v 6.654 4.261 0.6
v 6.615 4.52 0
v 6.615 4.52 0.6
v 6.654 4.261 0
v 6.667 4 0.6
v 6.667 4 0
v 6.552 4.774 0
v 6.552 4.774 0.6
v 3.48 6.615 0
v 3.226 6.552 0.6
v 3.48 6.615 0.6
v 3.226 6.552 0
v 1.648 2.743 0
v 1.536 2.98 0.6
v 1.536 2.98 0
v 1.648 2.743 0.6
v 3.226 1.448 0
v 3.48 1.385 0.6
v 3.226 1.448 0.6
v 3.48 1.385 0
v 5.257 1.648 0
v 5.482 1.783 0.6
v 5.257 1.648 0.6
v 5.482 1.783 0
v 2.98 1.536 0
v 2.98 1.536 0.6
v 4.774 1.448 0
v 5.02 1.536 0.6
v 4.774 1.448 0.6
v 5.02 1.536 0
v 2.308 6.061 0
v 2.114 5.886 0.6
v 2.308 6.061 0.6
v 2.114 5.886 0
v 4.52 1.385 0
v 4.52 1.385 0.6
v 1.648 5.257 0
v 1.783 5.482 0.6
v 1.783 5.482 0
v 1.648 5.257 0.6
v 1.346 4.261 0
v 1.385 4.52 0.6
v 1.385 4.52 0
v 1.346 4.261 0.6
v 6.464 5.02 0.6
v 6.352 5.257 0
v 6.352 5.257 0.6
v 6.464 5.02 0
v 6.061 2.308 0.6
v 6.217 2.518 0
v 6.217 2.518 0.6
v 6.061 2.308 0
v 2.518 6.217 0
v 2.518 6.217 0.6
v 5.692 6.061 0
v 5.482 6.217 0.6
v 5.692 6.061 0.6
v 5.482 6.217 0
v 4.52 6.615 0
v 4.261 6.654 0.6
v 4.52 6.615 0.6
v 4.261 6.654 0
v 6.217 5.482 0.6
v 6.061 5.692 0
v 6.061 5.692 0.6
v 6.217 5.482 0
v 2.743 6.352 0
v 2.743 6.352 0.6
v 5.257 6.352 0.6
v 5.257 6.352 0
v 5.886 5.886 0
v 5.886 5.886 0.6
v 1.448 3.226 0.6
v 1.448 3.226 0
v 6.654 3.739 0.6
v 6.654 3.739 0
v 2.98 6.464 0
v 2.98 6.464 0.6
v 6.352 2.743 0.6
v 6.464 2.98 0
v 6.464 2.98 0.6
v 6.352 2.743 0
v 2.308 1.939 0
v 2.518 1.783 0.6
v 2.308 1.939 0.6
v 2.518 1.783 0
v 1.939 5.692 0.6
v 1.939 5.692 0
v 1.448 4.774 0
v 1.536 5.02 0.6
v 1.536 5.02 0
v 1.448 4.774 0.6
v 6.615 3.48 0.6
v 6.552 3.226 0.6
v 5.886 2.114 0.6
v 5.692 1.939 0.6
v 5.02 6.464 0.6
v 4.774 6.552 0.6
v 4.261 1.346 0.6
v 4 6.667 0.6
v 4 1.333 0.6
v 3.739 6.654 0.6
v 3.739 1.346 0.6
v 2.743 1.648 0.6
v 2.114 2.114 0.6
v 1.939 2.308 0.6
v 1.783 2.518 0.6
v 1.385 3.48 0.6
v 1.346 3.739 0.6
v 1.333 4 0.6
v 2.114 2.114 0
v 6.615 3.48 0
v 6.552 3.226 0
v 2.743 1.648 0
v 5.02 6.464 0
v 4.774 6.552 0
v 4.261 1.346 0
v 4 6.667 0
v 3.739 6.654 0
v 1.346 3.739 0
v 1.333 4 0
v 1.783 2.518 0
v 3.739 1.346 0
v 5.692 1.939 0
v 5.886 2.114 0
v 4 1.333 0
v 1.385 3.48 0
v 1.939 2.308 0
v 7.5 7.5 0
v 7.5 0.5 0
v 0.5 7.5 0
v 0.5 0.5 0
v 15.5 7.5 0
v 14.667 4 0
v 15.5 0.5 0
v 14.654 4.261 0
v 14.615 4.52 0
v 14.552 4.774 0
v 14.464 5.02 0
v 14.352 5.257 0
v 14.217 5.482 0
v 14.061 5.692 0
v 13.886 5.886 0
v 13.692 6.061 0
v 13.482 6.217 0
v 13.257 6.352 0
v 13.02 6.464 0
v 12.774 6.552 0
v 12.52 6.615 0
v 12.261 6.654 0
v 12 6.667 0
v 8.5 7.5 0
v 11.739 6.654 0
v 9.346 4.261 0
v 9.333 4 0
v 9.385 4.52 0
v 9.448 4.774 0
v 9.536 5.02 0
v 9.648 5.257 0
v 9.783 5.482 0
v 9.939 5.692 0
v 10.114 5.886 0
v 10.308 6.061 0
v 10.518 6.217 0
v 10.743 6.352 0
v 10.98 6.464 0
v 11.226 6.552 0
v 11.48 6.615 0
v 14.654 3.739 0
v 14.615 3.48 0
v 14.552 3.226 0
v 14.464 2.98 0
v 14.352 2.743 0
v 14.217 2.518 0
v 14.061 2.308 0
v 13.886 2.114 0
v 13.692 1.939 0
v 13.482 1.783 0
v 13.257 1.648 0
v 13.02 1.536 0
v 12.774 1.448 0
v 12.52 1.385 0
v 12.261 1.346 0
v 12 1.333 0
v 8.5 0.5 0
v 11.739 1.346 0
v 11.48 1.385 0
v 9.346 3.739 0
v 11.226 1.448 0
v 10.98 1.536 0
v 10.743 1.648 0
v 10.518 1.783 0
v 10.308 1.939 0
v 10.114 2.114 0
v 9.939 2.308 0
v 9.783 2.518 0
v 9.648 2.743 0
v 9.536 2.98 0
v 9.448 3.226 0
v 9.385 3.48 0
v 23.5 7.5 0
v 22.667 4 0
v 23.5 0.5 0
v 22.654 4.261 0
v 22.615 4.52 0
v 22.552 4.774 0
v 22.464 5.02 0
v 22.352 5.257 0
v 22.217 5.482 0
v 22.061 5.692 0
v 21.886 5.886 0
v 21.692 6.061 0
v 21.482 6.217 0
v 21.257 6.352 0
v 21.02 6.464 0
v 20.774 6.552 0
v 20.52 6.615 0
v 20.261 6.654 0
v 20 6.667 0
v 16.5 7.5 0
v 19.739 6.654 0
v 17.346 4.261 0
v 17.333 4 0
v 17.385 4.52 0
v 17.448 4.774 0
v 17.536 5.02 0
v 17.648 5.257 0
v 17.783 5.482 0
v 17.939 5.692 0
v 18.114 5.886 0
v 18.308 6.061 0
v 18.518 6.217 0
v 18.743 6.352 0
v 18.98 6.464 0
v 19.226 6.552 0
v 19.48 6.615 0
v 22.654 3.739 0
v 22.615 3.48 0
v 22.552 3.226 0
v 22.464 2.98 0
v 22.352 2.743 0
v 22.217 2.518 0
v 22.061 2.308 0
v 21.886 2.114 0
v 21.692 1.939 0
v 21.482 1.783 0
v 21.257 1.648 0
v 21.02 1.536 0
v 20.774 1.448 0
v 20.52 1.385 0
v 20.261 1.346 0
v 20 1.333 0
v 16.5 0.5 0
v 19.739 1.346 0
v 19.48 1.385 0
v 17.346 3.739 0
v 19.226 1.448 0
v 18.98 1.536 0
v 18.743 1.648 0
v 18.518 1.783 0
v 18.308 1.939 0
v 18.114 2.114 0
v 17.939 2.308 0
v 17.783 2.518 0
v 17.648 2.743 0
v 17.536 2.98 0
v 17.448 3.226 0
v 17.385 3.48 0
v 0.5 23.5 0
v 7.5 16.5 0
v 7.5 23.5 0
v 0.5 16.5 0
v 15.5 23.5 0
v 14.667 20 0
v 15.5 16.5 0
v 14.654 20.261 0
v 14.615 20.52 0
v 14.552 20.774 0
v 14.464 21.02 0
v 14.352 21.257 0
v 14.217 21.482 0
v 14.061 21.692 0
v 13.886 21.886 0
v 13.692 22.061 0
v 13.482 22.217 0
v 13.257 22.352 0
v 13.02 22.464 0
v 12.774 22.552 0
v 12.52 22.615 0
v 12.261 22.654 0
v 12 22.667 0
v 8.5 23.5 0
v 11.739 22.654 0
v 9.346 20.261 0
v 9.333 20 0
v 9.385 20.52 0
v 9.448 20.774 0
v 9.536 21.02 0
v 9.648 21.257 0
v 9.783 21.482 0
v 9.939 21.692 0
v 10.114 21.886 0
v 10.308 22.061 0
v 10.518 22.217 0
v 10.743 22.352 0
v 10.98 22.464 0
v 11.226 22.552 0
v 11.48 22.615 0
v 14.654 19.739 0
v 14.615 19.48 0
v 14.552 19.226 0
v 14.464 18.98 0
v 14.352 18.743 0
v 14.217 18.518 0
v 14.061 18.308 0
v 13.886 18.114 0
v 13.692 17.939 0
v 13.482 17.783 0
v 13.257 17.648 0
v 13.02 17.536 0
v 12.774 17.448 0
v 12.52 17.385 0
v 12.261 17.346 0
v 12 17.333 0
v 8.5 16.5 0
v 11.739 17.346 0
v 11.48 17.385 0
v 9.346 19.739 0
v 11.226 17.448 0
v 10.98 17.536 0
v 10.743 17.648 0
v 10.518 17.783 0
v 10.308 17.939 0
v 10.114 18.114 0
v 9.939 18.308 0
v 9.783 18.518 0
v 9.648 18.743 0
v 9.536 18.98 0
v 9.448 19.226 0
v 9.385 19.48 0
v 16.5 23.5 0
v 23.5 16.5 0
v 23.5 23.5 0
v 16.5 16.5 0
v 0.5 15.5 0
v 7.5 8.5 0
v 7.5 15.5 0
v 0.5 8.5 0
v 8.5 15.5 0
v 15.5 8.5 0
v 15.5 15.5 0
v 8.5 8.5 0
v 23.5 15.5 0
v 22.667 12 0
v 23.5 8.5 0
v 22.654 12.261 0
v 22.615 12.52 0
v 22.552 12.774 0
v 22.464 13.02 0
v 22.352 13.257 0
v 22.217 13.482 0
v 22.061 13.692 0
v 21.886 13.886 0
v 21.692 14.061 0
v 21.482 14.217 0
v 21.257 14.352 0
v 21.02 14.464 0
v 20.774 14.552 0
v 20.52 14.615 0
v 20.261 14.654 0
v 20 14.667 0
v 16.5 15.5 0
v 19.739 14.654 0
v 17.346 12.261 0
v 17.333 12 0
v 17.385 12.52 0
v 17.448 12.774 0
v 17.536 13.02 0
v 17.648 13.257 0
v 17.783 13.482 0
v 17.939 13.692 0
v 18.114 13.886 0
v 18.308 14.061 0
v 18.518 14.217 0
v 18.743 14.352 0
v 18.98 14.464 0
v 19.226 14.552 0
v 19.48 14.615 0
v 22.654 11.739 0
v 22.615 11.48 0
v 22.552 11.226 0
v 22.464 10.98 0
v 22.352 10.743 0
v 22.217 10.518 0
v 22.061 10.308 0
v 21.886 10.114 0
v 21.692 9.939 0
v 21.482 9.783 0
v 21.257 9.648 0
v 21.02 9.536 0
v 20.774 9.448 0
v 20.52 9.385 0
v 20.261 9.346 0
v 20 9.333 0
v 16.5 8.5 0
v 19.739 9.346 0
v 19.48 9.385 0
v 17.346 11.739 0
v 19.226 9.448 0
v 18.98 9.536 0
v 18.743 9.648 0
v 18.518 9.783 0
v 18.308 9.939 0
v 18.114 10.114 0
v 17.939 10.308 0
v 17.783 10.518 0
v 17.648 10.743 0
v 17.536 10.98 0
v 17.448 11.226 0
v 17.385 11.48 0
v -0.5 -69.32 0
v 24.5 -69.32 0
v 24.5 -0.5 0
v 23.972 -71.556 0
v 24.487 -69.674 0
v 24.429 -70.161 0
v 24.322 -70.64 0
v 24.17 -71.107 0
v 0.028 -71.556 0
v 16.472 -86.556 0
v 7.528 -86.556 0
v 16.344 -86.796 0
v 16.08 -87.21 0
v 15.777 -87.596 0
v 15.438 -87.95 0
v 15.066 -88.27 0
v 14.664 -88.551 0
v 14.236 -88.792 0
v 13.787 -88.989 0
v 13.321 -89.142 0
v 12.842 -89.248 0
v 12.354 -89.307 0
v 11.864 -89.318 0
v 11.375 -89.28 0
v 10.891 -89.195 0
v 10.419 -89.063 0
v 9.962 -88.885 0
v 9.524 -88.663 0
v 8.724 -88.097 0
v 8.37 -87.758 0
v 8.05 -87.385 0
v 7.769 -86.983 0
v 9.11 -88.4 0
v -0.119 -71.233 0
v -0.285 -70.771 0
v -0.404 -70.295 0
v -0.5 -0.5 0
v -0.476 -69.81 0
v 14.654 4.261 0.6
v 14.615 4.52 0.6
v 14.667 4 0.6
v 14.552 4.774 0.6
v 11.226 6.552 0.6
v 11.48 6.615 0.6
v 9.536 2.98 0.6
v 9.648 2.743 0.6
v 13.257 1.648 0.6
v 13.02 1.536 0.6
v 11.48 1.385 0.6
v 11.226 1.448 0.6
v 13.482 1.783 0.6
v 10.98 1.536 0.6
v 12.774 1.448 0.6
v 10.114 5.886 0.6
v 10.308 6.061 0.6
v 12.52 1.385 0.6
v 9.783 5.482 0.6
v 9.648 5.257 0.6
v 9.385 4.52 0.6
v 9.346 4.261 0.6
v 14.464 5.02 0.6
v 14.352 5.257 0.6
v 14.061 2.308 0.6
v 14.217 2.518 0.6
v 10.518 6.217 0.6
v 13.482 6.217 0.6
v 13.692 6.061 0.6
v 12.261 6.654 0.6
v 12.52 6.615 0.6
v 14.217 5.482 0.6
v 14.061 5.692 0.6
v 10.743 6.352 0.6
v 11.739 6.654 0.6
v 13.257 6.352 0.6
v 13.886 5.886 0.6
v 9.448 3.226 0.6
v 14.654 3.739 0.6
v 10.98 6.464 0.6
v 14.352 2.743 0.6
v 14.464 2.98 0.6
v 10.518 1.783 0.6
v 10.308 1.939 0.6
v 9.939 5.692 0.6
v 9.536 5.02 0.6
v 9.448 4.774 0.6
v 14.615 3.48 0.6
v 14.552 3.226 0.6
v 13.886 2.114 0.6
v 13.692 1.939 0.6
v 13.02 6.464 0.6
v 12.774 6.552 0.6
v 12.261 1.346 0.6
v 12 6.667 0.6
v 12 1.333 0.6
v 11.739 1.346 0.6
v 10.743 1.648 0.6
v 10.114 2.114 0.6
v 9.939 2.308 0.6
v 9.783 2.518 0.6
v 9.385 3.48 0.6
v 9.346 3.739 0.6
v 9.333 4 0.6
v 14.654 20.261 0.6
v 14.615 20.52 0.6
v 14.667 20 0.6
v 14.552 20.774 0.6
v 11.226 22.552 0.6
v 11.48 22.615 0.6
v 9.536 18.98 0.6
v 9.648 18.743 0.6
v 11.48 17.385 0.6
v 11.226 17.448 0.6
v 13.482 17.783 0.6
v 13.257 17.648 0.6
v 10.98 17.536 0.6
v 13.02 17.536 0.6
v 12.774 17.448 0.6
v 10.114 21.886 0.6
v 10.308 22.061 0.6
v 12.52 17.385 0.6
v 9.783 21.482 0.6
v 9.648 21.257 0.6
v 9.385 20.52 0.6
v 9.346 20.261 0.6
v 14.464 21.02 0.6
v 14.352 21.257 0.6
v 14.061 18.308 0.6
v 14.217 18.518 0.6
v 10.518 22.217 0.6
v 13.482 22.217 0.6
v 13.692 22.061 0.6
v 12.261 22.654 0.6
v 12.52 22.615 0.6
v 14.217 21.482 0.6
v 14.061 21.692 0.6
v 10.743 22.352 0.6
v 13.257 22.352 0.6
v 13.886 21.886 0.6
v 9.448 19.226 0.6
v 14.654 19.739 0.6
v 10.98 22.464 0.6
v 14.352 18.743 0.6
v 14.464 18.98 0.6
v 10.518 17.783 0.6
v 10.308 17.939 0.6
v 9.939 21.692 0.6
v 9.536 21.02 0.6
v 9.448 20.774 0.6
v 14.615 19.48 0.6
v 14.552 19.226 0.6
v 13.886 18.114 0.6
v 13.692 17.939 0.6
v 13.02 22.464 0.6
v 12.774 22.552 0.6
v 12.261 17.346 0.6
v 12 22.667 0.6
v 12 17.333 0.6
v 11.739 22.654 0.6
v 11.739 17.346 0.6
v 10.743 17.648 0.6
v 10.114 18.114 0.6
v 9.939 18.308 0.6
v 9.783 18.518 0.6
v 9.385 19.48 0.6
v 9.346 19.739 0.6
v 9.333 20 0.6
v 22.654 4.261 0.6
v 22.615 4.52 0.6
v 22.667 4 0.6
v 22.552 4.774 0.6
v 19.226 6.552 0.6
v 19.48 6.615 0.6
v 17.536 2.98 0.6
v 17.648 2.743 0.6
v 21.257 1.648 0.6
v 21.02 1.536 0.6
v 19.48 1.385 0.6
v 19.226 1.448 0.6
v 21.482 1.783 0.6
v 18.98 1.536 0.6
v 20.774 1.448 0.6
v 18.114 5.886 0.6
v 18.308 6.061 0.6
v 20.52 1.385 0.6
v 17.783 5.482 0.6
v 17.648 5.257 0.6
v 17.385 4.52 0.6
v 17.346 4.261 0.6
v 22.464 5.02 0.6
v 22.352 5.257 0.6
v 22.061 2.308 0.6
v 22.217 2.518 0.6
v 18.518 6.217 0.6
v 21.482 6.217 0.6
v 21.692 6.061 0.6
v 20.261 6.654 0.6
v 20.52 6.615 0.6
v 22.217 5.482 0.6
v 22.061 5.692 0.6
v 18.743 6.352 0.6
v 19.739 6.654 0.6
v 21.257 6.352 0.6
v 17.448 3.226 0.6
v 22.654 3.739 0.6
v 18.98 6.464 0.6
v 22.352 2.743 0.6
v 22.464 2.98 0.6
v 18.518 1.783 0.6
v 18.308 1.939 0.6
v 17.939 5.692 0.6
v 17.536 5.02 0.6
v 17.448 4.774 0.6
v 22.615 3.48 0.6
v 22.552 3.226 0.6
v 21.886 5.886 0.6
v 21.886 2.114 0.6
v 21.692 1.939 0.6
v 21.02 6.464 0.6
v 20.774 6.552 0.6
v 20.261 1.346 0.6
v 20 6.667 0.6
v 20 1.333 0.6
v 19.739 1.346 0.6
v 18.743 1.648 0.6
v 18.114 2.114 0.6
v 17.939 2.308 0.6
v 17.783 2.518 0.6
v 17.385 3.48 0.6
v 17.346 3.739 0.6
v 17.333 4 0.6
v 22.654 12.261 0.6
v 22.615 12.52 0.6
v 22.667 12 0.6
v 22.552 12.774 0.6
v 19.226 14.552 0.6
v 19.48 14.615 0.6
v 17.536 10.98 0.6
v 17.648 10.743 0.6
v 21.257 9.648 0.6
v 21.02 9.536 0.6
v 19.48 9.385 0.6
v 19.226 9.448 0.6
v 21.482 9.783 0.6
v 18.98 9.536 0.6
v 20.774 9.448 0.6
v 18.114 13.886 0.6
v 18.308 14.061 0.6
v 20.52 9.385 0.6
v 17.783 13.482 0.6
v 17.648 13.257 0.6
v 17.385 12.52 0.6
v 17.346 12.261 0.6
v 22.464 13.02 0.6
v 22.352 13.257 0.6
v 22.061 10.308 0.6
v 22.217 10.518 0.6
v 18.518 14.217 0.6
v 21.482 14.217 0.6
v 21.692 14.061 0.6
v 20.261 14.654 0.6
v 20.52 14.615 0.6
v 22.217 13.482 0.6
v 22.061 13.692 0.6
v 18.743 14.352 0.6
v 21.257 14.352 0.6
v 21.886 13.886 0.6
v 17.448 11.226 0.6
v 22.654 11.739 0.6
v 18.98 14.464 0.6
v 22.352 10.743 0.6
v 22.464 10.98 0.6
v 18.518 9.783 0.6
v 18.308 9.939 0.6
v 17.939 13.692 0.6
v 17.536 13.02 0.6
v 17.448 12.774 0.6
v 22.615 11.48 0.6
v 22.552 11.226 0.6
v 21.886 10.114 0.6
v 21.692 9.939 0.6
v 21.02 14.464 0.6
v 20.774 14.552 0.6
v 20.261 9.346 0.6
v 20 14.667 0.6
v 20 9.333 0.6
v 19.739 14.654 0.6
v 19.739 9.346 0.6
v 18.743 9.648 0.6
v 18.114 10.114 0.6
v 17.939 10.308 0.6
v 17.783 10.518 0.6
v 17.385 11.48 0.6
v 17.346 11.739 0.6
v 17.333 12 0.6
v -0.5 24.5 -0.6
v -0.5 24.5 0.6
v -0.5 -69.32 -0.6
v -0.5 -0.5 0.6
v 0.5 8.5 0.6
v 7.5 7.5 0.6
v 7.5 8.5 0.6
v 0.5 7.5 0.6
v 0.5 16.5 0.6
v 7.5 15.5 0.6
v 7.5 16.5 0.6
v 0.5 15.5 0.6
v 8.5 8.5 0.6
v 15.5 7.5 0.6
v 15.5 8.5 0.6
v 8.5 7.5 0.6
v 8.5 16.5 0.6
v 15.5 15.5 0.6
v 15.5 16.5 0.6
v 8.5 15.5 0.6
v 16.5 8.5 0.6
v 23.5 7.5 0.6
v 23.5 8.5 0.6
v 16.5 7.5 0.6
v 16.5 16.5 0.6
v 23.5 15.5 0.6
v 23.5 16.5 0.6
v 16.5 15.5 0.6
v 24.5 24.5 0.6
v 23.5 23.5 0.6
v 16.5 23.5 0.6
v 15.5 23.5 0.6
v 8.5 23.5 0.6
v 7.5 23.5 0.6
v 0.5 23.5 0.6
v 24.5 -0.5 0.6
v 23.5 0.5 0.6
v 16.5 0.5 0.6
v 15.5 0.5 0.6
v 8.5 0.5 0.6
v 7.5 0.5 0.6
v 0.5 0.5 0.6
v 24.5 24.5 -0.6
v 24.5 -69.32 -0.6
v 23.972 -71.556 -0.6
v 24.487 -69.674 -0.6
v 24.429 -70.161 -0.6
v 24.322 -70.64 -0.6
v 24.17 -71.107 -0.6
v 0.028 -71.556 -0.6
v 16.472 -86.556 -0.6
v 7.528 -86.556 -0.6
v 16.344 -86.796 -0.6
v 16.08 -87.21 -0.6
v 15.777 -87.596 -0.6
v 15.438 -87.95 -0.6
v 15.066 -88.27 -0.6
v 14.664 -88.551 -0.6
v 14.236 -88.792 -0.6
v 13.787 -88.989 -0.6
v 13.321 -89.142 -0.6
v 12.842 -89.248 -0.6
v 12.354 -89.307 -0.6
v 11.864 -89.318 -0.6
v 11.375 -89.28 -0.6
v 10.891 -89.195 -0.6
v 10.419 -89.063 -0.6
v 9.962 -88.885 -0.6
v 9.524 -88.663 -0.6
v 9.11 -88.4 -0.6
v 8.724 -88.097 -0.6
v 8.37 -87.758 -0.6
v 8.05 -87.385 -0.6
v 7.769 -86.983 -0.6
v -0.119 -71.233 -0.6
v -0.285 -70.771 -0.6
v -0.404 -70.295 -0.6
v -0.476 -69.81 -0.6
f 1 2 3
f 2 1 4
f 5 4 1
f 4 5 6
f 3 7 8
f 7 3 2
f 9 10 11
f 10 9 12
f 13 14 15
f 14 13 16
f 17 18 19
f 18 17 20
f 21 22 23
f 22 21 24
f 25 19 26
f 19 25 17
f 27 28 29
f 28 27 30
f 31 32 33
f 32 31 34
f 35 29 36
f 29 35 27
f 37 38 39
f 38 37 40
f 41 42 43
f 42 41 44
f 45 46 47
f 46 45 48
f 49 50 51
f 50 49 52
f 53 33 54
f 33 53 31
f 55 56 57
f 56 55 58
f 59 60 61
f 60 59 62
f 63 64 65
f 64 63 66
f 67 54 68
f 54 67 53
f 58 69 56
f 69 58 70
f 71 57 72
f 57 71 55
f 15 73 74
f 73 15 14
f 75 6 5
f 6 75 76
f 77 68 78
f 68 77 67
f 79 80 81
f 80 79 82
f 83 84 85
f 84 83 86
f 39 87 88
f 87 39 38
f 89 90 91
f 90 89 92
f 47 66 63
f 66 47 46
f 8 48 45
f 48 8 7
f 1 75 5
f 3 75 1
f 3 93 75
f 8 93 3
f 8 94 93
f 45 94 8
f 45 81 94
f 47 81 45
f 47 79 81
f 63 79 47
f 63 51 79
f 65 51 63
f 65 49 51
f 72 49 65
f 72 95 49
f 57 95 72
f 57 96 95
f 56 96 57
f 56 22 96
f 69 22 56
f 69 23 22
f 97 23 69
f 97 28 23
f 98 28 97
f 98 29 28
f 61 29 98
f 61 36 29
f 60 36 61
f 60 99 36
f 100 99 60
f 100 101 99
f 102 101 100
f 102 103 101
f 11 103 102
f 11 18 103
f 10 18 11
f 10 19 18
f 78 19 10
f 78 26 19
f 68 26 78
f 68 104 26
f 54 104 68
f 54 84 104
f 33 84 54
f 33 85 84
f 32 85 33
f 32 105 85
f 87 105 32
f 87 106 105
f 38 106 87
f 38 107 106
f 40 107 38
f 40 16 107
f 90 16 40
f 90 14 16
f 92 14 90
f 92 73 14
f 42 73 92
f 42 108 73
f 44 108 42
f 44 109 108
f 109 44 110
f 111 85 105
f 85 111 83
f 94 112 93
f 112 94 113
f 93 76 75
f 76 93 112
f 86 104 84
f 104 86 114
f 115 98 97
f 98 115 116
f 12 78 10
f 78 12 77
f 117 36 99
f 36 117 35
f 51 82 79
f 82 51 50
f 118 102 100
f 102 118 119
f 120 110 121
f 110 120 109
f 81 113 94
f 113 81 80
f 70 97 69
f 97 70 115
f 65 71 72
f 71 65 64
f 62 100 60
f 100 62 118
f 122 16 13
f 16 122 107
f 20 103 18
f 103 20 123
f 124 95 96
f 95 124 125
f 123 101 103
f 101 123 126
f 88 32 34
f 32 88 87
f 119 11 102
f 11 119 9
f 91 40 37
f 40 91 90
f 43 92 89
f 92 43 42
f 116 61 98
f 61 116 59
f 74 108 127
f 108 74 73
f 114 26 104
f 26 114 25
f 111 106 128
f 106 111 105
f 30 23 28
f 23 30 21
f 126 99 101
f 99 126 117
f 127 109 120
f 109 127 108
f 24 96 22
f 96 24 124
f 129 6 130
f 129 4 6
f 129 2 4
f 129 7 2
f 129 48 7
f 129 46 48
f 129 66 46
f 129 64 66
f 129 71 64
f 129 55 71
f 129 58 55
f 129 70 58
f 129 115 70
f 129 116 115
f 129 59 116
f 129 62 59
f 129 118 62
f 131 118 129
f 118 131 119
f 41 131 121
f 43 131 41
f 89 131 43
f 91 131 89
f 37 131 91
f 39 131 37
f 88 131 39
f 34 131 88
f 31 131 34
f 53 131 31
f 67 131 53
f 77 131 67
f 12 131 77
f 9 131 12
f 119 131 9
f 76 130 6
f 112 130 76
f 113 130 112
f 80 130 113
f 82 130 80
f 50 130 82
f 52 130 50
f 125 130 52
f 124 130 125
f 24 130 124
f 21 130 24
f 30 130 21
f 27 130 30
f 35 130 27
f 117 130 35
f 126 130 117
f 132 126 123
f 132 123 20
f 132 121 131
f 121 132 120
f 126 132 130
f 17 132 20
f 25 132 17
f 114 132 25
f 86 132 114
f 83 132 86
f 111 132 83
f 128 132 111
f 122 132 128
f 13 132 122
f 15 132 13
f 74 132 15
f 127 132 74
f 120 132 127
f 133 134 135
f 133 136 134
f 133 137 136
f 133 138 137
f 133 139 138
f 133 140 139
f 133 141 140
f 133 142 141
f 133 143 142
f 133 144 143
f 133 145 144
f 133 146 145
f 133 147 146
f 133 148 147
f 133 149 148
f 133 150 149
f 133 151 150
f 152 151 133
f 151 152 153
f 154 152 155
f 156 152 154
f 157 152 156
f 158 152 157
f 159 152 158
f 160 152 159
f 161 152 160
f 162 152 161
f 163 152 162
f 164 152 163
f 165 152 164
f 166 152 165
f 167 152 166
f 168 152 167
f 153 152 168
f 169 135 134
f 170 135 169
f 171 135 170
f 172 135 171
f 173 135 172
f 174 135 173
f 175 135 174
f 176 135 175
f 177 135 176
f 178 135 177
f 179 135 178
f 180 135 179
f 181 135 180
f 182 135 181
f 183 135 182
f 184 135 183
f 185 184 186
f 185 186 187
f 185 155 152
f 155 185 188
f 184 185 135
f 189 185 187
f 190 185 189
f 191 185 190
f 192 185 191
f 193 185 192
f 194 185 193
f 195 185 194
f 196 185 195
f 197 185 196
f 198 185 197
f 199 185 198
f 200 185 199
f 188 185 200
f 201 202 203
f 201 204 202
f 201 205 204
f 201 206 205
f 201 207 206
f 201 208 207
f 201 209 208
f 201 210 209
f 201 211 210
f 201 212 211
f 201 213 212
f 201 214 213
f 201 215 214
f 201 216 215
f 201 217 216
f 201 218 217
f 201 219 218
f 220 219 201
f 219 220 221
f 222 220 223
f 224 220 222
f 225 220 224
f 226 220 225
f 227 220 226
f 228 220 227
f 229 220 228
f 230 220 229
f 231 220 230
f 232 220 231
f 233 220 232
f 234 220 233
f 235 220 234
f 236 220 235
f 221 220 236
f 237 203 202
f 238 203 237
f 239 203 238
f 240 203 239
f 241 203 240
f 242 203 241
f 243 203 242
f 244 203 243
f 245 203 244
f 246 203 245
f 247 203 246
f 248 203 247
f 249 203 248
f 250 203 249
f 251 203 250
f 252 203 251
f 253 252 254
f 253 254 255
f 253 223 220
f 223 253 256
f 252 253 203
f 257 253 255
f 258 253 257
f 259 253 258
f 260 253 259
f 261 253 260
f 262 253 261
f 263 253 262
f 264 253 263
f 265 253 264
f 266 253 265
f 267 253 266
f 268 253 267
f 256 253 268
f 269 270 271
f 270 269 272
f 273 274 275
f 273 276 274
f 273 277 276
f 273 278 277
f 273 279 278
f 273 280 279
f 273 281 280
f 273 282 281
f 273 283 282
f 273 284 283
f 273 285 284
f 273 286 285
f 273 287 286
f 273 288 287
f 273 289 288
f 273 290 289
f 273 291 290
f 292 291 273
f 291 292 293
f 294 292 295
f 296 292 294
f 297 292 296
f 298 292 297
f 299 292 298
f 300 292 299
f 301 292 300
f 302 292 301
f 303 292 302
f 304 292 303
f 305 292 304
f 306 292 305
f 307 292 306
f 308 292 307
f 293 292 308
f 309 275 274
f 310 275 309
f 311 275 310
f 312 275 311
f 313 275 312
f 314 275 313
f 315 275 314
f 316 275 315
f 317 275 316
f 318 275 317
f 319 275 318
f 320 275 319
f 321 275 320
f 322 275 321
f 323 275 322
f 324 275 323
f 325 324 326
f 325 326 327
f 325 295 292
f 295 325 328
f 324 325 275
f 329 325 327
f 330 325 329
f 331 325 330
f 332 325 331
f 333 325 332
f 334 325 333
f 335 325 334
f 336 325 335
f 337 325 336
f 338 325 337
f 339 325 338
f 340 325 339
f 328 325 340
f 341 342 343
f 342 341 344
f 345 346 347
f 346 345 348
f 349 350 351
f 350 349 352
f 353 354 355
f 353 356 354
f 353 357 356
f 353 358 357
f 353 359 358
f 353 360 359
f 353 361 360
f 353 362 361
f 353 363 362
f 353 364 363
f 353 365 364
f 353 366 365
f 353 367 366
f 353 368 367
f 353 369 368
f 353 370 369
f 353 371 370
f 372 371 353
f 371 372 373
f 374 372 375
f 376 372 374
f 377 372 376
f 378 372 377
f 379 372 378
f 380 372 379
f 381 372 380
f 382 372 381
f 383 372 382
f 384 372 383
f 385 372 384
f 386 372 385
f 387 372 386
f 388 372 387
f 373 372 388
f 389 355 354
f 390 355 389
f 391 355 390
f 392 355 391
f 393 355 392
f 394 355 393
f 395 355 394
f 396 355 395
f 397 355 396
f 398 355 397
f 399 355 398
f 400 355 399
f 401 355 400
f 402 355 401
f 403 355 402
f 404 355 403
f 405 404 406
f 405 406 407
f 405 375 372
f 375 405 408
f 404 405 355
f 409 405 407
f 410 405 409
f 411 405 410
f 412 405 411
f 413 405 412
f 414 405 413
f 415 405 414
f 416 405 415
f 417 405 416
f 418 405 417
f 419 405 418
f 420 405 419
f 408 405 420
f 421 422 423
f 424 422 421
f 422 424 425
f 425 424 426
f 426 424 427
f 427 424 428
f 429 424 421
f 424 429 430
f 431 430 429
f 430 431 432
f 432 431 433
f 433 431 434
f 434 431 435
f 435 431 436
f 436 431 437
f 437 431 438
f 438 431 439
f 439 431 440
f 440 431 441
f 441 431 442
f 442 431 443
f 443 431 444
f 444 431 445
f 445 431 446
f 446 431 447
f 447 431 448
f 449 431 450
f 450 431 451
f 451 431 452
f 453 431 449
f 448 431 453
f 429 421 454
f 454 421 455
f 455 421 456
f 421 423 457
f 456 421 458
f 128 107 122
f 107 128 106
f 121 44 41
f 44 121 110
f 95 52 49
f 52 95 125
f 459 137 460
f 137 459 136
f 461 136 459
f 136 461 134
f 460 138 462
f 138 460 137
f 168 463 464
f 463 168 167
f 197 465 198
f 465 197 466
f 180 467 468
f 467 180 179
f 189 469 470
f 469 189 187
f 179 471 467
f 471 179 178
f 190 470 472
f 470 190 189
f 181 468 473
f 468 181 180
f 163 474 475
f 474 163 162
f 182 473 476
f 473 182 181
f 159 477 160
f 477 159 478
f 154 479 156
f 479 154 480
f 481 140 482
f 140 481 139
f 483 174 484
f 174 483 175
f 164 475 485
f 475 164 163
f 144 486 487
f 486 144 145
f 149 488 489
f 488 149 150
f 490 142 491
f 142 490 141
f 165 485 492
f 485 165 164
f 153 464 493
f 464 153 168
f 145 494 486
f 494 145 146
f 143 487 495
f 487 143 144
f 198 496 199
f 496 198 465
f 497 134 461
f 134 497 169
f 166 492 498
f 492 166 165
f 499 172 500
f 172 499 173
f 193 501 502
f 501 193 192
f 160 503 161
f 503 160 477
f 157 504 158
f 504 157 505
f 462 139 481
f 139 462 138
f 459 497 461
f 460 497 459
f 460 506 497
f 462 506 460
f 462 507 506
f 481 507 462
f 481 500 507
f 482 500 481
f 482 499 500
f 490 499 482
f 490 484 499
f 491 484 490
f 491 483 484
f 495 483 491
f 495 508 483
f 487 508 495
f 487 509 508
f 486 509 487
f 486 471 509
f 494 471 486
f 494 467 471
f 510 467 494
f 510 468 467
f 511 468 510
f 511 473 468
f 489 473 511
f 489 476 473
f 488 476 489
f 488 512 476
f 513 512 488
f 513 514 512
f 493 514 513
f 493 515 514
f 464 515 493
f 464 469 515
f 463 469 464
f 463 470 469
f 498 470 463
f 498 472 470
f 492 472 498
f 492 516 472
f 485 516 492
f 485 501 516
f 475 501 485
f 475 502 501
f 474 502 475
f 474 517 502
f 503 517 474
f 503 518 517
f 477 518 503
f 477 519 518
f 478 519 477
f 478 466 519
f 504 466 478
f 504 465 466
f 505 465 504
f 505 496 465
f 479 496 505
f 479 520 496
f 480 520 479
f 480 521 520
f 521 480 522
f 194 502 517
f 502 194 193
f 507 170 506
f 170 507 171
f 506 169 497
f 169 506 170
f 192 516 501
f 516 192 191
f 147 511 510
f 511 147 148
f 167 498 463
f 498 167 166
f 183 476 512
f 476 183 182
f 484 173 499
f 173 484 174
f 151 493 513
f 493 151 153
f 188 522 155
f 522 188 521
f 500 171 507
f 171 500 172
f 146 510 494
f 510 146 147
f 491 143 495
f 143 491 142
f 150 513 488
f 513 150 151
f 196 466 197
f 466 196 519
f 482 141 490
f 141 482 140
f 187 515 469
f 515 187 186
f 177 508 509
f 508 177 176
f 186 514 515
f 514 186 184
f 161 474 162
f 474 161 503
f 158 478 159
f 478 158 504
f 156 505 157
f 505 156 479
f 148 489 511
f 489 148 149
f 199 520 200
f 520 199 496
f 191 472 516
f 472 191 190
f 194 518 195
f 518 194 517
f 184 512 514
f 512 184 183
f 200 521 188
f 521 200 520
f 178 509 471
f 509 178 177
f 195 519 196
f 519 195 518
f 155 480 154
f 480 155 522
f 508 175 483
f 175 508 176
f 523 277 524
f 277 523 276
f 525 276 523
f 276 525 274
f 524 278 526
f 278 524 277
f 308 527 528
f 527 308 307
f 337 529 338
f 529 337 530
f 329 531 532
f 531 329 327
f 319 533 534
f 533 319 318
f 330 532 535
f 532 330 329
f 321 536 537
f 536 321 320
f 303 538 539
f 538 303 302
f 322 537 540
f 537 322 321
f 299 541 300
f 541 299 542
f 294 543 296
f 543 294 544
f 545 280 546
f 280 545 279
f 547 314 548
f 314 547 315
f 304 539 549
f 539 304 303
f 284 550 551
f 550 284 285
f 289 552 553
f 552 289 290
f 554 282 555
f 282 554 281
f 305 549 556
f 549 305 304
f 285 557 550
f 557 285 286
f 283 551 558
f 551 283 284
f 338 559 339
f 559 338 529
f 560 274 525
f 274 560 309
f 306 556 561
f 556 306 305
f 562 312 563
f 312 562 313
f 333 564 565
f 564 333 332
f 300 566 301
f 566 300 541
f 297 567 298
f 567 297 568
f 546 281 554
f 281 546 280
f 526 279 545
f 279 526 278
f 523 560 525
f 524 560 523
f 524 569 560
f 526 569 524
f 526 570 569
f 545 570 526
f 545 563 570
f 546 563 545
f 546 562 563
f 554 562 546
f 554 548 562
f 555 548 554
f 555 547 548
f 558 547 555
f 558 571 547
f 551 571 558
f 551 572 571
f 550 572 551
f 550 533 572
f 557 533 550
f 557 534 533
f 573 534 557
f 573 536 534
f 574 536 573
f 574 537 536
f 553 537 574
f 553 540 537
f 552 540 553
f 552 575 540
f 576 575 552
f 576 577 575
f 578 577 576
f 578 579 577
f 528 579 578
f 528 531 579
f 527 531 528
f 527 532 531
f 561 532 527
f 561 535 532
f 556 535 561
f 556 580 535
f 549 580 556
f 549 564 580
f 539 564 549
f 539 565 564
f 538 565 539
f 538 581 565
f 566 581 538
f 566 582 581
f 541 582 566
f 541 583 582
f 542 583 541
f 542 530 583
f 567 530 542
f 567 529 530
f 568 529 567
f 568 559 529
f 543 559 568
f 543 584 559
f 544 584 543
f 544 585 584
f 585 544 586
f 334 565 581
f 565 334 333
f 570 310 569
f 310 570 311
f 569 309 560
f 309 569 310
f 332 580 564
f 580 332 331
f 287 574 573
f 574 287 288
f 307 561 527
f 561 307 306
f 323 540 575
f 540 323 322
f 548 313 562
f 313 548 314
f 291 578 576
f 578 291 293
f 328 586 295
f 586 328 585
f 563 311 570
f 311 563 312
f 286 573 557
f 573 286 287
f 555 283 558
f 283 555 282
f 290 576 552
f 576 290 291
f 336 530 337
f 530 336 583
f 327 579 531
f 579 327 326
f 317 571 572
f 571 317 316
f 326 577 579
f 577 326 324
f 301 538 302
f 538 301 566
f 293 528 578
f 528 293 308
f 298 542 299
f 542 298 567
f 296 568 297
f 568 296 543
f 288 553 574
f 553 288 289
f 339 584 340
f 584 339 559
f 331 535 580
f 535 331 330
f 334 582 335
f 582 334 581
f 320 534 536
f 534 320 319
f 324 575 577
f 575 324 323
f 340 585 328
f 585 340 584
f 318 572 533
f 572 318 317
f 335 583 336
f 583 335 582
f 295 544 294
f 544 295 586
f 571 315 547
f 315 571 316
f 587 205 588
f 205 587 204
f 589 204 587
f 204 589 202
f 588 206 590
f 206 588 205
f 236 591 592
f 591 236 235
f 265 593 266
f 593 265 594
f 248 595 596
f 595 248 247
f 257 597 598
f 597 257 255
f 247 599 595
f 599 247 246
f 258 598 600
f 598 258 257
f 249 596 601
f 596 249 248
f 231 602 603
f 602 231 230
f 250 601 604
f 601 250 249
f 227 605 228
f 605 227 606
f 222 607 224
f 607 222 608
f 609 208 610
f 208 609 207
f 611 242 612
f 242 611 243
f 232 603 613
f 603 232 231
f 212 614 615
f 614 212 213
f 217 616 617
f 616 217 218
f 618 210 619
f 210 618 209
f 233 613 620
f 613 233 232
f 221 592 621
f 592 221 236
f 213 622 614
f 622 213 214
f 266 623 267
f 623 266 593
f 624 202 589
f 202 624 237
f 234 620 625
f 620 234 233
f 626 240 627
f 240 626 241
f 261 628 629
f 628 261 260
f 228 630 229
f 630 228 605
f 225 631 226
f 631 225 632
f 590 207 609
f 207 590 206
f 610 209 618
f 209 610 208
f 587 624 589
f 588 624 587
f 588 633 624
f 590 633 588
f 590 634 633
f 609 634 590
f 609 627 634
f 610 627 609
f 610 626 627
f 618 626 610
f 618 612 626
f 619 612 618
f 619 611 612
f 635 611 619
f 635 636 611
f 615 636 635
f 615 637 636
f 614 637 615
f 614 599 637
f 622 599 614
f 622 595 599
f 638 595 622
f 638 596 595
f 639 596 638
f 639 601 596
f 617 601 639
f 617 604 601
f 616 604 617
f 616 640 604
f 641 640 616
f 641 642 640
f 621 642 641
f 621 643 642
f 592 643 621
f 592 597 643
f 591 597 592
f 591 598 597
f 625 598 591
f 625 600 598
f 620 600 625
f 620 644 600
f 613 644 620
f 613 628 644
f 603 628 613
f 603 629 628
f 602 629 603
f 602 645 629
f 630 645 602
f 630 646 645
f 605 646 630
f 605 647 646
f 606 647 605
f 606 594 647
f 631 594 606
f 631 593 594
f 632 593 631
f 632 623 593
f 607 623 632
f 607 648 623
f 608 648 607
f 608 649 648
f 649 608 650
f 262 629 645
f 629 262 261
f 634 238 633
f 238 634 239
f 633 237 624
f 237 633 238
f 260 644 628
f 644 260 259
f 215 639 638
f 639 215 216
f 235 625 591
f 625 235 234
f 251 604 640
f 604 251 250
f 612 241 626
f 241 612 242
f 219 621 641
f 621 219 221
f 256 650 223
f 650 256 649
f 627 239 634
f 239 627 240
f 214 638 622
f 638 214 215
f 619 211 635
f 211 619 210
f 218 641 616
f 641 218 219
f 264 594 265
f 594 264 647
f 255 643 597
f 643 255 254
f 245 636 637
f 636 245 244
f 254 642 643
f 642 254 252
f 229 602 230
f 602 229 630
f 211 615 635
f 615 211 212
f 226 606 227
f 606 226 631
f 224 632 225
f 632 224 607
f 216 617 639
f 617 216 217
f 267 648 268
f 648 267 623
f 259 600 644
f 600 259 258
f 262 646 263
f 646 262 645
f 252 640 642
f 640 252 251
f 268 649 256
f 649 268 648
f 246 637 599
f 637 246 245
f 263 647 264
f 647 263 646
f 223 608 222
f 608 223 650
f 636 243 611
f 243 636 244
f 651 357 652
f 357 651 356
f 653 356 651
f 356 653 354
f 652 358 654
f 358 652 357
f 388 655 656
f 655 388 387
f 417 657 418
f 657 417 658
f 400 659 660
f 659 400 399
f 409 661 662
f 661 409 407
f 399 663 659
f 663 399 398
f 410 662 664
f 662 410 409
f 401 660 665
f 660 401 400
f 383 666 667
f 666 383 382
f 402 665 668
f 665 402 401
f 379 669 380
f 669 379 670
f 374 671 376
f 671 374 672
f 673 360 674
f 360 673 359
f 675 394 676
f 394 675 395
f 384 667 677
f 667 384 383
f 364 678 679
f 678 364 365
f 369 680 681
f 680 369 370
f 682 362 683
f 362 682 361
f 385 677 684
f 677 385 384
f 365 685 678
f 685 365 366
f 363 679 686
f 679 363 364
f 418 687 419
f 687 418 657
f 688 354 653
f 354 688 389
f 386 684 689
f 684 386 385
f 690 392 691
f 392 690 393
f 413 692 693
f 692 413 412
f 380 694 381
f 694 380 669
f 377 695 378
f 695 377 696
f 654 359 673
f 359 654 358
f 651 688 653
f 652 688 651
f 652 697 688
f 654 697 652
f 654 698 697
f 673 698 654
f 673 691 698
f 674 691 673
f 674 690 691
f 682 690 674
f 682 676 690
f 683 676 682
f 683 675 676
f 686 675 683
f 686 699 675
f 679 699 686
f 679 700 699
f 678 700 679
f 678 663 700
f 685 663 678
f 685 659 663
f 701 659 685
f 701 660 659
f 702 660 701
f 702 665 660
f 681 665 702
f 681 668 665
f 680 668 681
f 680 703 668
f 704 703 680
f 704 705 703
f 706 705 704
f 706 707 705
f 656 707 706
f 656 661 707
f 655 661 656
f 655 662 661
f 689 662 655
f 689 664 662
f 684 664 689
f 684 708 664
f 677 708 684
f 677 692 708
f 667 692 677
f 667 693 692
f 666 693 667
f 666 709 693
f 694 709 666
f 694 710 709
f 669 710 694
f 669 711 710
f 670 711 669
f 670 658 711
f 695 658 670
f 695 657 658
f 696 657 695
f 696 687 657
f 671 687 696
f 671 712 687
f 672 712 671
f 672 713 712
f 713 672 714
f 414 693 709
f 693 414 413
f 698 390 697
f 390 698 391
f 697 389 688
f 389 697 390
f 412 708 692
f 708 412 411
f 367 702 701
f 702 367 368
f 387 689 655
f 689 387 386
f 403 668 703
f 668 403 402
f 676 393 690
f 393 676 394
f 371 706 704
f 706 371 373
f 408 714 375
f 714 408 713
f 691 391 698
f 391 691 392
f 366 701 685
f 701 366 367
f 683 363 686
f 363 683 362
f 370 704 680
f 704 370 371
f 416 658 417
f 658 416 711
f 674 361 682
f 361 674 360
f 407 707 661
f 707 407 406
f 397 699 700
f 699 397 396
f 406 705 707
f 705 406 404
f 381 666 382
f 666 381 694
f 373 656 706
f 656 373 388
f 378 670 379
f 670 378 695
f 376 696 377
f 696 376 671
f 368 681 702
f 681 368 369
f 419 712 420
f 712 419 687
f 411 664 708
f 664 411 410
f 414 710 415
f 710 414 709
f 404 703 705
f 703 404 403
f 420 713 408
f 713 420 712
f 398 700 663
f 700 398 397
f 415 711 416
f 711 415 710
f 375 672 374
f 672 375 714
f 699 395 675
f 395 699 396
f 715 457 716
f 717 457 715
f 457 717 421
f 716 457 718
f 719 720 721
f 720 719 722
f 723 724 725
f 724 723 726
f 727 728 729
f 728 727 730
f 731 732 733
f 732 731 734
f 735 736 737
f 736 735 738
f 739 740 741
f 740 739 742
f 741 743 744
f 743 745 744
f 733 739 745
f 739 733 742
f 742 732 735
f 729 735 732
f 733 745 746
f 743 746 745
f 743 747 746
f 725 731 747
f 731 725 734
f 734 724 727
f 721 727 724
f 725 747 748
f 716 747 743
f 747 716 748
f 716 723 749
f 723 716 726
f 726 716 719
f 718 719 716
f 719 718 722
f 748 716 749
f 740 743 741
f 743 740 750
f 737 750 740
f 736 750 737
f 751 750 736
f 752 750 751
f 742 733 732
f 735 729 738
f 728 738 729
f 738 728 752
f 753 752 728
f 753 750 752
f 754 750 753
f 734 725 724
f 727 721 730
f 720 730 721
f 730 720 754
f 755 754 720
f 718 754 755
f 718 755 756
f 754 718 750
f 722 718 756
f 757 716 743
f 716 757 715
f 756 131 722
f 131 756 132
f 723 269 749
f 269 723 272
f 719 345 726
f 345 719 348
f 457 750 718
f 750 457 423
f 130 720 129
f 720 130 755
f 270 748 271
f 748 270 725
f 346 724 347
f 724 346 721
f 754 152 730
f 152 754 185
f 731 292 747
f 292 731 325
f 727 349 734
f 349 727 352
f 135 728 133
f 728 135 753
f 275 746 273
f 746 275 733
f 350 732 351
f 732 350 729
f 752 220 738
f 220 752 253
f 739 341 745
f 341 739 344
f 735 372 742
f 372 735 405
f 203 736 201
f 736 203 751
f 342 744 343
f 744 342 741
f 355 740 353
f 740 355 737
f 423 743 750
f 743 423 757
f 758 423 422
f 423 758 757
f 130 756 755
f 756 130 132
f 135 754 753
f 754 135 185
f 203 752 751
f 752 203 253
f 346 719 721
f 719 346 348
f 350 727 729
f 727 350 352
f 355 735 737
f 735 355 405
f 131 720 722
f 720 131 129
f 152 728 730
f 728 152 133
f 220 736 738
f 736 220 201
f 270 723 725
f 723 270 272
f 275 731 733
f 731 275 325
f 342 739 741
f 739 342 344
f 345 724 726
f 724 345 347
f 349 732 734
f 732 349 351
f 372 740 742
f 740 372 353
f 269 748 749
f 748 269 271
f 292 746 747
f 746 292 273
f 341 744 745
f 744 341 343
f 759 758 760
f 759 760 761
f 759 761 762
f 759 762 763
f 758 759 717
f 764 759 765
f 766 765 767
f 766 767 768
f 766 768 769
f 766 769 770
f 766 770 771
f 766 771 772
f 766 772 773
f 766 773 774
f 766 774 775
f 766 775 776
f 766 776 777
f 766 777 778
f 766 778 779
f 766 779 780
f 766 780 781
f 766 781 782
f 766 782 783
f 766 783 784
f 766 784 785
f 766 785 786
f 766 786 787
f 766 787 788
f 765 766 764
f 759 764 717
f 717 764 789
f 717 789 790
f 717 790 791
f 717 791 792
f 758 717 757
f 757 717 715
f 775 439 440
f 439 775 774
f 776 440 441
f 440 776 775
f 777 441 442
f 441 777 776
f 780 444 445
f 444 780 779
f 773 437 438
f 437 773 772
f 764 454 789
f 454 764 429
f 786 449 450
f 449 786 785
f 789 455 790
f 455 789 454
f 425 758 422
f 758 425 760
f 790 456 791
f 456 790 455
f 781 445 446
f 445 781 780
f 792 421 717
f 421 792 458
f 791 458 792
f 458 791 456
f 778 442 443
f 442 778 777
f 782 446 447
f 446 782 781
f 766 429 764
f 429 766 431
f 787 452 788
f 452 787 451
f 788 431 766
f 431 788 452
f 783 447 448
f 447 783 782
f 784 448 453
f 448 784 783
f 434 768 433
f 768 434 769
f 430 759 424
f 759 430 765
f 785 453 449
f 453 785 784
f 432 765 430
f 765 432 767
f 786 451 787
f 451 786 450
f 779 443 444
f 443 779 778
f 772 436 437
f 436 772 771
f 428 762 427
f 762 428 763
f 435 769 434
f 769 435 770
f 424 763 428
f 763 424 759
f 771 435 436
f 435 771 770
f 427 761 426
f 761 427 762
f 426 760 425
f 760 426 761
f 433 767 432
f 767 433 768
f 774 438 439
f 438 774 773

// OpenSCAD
line_width = 1;
figure_width = 25;
figure_thickness = 0.6;
logo_layout = [
    [true, false, false],
    [true, false, true],
    [true, true, false]
];
logo_height = 0.6;
bookmark_length = 120;
bookmark_rounding = 5;

segment_width = (figure_width-line_width) / 3;

$fn=64;

module line(w, h, a, b) {
    linear_extrude(h) hull() {
        translate(a) square(w, center=true);
        translate(b) square(w, center=true);
    }
}

function translate_circle(x, y) = [segment_width*x+segment_width/2, segment_width*y+segment_width/2];

module logo() {
    translate([-line_width/2, -line_width/2, -figure_thickness]) cube([figure_width, figure_width, figure_thickness]);
    for(x=[0:2], y=[0:2]) {
        if(logo_layout[x][y]) {
            translate(translate_circle(x, y)) cylinder(h=logo_height, r=segment_width/3);
        }
    }
    //vertical lines
    for (x=[0:3]) {
        line(line_width, logo_height, [segment_width*x, 0], [segment_width*x, figure_width-line_width]);
    }
    //horizontal lines
    for (y=[0:3]) {
        line(line_width, logo_height, [0, segment_width*y], [figure_width-line_width, segment_width*y]);
    }
    //bookmark
    translate([-line_width/2, -line_width/2, -figure_thickness]) linear_extrude(figure_thickness) offset(r=bookmark_rounding) offset(r=-bookmark_rounding) polygon([
        [0, figure_width],
        [figure_width, figure_width],
        [figure_width, figure_width*2-bookmark_length],
        [figure_width/2, figure_width-bookmark_length],
        [0, figure_width*2-bookmark_length]
    ]);
}

logo();
